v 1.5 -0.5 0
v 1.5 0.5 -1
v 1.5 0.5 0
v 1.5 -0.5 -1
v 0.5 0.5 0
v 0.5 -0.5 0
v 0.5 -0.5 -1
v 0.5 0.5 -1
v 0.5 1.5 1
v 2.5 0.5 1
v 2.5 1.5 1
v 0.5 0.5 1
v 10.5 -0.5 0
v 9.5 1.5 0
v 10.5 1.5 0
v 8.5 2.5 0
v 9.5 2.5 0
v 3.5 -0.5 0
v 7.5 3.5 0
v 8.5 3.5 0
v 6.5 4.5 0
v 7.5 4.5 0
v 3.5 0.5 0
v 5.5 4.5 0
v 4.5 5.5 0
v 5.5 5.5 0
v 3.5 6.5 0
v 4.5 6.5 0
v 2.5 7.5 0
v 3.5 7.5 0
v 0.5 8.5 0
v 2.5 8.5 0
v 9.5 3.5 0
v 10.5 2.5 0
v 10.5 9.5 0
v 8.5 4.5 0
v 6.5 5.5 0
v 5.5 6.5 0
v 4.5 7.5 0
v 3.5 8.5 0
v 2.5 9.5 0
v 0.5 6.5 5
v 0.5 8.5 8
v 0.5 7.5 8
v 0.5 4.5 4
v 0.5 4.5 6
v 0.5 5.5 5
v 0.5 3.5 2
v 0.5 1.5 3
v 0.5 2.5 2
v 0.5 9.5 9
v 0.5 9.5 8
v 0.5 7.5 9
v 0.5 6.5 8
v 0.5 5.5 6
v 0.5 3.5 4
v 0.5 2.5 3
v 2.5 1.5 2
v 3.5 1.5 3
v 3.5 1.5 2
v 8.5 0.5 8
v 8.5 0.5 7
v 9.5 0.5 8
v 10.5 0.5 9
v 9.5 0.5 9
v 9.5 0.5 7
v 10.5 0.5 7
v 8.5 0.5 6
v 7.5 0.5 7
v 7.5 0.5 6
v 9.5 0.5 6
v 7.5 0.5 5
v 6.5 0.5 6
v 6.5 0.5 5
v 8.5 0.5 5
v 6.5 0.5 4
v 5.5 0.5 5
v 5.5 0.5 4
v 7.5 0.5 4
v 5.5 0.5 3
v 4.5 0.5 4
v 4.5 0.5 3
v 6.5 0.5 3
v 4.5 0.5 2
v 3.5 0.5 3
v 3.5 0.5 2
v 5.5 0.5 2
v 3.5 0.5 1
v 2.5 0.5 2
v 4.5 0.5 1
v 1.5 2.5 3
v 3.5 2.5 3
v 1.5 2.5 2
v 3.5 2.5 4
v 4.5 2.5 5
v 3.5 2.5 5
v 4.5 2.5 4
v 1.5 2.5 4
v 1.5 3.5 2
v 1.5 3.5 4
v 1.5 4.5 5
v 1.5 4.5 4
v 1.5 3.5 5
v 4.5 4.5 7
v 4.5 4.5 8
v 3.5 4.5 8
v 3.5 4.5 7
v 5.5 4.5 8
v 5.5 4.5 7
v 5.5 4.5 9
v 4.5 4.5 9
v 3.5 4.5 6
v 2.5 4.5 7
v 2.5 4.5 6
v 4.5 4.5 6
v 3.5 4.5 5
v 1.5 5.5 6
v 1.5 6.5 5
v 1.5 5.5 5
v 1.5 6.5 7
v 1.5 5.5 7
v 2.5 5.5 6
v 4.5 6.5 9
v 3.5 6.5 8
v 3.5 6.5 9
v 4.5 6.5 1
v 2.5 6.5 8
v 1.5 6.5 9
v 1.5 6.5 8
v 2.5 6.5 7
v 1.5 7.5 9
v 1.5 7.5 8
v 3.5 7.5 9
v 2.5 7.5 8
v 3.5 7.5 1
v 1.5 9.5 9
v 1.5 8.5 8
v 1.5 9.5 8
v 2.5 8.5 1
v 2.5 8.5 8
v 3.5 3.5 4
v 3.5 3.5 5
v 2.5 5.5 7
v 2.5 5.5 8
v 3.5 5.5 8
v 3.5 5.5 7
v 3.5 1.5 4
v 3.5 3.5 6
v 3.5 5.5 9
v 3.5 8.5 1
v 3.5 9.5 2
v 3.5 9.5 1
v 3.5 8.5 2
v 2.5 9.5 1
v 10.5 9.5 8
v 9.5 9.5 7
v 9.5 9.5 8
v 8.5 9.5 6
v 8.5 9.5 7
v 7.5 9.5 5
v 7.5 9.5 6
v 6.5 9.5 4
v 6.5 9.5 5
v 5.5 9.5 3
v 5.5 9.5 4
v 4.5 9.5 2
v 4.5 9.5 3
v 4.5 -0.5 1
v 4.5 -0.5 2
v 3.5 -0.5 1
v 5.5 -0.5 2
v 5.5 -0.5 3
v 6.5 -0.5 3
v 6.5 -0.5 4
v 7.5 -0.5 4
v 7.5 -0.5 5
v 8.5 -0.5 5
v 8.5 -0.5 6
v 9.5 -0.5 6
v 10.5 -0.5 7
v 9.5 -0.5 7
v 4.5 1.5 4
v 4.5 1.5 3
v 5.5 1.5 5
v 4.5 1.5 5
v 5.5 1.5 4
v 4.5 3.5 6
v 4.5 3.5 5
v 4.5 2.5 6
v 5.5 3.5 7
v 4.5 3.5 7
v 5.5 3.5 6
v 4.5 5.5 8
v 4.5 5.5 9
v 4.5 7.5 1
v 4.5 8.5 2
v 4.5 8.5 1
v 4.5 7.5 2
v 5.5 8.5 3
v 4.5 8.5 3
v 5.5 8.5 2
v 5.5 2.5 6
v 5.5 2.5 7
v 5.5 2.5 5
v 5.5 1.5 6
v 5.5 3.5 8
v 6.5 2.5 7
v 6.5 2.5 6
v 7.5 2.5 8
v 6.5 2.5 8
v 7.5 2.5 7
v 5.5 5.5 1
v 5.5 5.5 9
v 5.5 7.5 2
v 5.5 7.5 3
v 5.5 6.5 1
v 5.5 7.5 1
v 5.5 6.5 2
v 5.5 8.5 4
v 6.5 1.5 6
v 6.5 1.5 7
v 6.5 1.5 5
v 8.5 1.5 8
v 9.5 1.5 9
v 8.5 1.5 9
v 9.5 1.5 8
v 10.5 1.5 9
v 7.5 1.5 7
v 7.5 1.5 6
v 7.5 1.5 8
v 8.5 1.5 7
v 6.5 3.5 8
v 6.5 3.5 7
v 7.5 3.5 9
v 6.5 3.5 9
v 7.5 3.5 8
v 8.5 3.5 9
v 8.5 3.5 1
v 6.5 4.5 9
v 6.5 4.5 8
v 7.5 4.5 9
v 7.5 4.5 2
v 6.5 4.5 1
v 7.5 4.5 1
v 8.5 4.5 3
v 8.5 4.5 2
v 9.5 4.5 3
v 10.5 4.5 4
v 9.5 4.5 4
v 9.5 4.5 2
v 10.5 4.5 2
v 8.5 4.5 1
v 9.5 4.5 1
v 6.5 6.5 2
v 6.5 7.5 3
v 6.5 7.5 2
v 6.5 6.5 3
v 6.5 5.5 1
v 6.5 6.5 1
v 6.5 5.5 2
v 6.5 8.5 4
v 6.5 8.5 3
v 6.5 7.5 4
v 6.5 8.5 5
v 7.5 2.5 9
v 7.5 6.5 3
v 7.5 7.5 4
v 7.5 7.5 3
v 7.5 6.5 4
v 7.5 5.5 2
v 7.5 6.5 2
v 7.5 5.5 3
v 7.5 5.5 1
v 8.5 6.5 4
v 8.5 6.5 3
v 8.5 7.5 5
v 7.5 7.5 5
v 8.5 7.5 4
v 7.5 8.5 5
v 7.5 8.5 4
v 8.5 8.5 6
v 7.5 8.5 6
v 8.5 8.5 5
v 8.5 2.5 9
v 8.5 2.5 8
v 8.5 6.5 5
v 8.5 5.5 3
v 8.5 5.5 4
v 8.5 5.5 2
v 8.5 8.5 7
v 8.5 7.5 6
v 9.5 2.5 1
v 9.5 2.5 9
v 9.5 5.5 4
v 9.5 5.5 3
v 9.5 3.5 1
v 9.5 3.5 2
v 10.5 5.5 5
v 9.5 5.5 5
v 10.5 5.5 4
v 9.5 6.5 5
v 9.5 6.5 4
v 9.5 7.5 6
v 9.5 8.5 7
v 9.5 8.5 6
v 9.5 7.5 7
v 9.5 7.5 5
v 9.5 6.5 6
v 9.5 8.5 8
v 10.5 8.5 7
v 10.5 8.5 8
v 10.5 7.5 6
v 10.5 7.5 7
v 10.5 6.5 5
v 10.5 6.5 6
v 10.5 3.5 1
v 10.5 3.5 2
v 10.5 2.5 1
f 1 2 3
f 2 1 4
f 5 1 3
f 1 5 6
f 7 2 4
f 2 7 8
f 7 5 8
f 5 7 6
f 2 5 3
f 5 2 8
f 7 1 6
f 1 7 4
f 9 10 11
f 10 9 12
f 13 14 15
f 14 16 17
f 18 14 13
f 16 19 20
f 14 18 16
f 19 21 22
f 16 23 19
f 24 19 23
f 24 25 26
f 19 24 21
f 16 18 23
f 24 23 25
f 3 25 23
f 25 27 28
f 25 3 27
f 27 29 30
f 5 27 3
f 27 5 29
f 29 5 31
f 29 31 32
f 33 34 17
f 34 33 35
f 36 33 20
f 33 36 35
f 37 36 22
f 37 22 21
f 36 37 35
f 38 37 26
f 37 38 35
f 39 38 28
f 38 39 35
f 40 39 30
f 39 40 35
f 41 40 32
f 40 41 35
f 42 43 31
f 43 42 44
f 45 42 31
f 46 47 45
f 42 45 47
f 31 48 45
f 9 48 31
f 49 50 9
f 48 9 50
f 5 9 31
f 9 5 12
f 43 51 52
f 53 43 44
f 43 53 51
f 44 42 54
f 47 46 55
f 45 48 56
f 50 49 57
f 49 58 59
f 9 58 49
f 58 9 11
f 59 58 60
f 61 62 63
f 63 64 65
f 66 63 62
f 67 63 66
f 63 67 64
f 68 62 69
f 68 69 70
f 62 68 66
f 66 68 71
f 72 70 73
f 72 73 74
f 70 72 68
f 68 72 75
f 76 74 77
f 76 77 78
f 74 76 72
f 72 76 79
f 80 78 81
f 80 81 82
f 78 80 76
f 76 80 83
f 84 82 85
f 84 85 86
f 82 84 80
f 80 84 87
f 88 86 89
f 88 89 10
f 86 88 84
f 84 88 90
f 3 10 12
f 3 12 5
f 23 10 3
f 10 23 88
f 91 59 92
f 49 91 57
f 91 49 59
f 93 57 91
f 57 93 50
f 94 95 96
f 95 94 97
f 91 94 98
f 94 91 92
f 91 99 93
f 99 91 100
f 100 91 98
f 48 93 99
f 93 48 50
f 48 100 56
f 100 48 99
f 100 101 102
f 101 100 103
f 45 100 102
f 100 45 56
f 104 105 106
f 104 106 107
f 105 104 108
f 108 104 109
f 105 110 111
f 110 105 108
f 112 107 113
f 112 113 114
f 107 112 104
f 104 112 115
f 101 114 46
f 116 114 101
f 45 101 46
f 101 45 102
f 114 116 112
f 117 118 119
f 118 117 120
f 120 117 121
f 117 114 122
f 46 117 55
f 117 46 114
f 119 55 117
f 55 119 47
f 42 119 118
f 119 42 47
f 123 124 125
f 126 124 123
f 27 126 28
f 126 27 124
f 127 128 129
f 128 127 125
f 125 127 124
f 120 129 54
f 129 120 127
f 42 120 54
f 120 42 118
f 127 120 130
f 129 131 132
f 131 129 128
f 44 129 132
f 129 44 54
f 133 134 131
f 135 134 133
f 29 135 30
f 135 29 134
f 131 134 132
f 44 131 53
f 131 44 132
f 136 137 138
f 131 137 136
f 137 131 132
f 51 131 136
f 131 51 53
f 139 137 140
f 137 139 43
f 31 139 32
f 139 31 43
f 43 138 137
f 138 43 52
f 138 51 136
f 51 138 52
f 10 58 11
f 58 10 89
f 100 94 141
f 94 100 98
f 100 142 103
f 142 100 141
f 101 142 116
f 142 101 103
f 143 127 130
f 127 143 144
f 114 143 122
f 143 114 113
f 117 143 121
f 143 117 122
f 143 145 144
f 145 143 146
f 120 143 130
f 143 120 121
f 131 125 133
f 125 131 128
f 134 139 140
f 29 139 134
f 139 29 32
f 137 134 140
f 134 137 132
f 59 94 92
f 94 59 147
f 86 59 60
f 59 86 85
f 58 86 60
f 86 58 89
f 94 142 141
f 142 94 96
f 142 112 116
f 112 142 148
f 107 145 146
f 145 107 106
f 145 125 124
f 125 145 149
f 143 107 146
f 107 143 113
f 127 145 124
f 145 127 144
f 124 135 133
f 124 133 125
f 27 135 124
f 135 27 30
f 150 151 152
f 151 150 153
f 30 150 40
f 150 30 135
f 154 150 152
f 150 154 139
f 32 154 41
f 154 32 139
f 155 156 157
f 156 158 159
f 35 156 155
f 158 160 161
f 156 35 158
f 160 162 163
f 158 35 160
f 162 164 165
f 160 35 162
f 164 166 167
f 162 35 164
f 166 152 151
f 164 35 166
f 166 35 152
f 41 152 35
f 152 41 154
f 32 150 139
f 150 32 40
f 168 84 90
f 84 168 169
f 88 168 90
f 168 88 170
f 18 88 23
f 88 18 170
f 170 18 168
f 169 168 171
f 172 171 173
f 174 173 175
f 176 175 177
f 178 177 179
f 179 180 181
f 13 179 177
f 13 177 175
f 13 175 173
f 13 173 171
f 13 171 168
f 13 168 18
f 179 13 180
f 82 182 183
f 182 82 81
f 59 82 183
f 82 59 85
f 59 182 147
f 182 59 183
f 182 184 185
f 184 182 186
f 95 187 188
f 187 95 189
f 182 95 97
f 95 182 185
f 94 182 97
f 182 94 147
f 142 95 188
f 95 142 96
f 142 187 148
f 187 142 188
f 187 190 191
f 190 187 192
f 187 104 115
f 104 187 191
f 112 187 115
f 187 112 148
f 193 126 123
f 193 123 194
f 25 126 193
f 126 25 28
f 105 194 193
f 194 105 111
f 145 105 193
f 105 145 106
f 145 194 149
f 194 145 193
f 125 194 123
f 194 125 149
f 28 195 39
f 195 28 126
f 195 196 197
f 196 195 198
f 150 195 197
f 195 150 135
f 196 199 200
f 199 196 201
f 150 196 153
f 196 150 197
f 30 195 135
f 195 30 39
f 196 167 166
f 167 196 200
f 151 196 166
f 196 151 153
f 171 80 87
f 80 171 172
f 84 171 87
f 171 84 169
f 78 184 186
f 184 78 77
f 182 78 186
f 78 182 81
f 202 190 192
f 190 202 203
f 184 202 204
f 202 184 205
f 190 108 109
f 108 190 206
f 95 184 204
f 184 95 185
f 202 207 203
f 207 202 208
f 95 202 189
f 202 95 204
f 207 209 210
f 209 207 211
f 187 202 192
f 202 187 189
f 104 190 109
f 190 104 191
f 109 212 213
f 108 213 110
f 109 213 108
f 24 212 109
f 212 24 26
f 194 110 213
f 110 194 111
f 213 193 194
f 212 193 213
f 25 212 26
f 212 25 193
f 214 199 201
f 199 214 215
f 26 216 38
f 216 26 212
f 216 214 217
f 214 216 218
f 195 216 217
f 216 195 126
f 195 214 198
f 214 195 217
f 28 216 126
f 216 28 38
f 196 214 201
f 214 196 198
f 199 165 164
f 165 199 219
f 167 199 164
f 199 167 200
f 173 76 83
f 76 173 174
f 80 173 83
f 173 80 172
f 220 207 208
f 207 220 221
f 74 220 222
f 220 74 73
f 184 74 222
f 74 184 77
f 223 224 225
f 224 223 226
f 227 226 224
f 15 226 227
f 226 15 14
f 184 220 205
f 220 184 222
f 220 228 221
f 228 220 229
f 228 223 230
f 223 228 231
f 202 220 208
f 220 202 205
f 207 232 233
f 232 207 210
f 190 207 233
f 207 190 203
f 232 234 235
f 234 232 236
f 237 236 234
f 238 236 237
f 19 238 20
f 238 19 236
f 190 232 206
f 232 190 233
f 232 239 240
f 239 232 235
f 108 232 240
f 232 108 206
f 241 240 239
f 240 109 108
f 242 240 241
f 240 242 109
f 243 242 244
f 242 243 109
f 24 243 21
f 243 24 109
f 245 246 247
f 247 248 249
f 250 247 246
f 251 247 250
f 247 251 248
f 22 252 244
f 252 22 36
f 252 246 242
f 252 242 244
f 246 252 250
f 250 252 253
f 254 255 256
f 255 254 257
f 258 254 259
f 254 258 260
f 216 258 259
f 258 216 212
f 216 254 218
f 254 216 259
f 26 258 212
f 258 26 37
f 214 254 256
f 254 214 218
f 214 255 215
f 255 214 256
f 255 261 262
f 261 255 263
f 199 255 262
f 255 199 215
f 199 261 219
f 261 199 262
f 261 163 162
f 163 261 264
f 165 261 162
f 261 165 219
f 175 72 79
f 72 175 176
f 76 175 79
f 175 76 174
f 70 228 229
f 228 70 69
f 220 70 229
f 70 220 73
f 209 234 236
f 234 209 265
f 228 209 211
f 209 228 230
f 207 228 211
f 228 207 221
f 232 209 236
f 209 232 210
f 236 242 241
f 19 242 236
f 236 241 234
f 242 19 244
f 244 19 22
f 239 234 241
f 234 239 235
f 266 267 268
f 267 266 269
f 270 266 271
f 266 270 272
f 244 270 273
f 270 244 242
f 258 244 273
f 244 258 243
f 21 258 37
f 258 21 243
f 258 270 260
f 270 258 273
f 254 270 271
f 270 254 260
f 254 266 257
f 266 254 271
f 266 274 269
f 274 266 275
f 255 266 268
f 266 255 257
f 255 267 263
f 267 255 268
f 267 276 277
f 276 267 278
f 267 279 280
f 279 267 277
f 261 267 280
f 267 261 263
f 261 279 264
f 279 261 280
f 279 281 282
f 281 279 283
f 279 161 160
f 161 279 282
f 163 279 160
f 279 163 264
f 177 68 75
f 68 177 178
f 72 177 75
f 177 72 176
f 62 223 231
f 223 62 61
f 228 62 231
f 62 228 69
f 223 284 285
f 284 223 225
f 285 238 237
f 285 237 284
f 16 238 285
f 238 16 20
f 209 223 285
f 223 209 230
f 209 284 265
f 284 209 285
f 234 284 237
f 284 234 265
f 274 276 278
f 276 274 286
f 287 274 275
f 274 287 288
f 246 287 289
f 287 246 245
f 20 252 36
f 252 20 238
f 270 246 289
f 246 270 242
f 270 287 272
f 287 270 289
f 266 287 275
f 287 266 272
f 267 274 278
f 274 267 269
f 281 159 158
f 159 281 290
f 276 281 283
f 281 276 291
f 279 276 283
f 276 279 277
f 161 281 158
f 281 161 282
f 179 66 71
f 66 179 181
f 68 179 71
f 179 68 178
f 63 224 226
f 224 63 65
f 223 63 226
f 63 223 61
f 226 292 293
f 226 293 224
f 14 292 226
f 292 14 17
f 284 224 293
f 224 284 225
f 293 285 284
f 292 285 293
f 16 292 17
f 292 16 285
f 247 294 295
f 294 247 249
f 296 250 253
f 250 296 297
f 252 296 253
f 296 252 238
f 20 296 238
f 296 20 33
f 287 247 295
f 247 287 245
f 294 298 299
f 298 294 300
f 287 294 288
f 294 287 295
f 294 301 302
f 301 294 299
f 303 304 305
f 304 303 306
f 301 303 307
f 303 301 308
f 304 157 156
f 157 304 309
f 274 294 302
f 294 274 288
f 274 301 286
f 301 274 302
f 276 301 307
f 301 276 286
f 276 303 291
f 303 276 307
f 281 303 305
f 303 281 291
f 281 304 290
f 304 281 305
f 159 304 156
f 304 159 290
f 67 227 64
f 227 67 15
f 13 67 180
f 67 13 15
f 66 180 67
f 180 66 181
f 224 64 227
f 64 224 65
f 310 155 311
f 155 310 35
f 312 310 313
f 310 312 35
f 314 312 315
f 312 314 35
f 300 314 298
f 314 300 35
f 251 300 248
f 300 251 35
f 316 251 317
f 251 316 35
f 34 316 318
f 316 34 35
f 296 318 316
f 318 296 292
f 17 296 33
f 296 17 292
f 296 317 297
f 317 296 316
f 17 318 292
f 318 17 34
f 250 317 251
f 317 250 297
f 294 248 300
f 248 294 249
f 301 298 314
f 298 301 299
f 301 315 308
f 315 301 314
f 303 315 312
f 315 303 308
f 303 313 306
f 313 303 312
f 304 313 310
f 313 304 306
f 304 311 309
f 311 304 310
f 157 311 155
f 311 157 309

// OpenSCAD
union() {
    translate([1, 0, -0.5]) color([1, 0, 0]) cube([1, 1, 1], center=true);
    translate([1, 1, 0.5]) cube([1, 1, 1], center=true);
    translate([1, 2, 1.5]) cube([1, 1, 3], center=true);
    translate([1, 3, 1.0]) cube([1, 1, 2], center=true);
    translate([1, 4, 2.0]) cube([1, 1, 4], center=true);
    translate([1, 5, 3.0]) cube([1, 1, 6], center=true);
    translate([1, 6, 2.5]) cube([1, 1, 5], center=true);
    translate([1, 7, 4.0]) cube([1, 1, 8], center=true);
    translate([1, 8, 4.5]) cube([1, 1, 9], center=true);
    translate([1, 9, 8.5]) color([0, 0, 1]) cube([1, 1, 1], center=true);
    translate([2, 1, 0.5]) cube([1, 1, 1], center=true);
    translate([2, 2, 1.5]) cube([1, 1, 3], center=true);
    translate([2, 3, 2.0]) cube([1, 1, 4], center=true);
    translate([2, 4, 2.5]) cube([1, 1, 5], center=true);
    translate([2, 5, 3.0]) cube([1, 1, 6], center=true);
    translate([2, 6, 3.5]) cube([1, 1, 7], center=true);
    translate([2, 7, 4.5]) cube([1, 1, 9], center=true);
    translate([2, 8, 4.0]) cube([1, 1, 8], center=true);
    translate([3, 1, 1.0]) cube([1, 1, 2], center=true);
    translate([3, 2, 1.5]) cube([1, 1, 3], center=true);
    translate([3, 3, 2.0]) cube([1, 1, 4], center=true);
    translate([3, 4, 2.5]) cube([1, 1, 5], center=true);
    translate([3, 5, 3.5]) cube([1, 1, 7], center=true);
    translate([3, 6, 4.0]) cube([1, 1, 8], center=true);
    translate([3, 7, 4.5]) cube([1, 1, 9], center=true);
    translate([3, 9, 0.5]) cube([1, 1, 1], center=true);
    translate([4, 0, 0.5]) cube([1, 1, 1], center=true);
    translate([4, 1, 1.5]) cube([1, 1, 3], center=true);
    translate([4, 2, 2.0]) cube([1, 1, 4], center=true);
    translate([4, 3, 2.5]) cube([1, 1, 5], center=true);
    translate([4, 4, 3.0]) cube([1, 1, 6], center=true);
    translate([4, 5, 4.0]) cube([1, 1, 8], center=true);
    translate([4, 6, 4.5]) cube([1, 1, 9], center=true);
    translate([4, 8, 0.5]) cube([1, 1, 1], center=true);
    translate([4, 9, 1.0]) cube([1, 1, 2], center=true);
    translate([5, 0, 1.0]) cube([1, 1, 2], center=true);
    translate([5, 1, 2.0]) cube([1, 1, 4], center=true);
    translate([5, 2, 2.5]) cube([1, 1, 5], center=true);
    translate([5, 3, 3.0]) cube([1, 1, 6], center=true);
    translate([5, 4, 3.5]) cube([1, 1, 7], center=true);
    translate([5, 5, 4.5]) cube([1, 1, 9], center=true);
    translate([5, 7, 0.5]) cube([1, 1, 1], center=true);
    translate([5, 8, 1.0]) cube([1, 1, 2], center=true);
    translate([5, 9, 1.5]) cube([1, 1, 3], center=true);
    translate([6, 0, 1.5]) cube([1, 1, 3], center=true);
    translate([6, 1, 2.5]) cube([1, 1, 5], center=true);
    translate([6, 2, 3.0]) cube([1, 1, 6], center=true);
    translate([6, 3, 3.5]) cube([1, 1, 7], center=true);
    translate([6, 4, 4.0]) cube([1, 1, 8], center=true);
    translate([6, 6, 0.5]) cube([1, 1, 1], center=true);
    translate([6, 7, 1.0]) cube([1, 1, 2], center=true);
    translate([6, 8, 1.5]) cube([1, 1, 3], center=true);
    translate([6, 9, 2.0]) cube([1, 1, 4], center=true);
    translate([7, 0, 2.0]) cube([1, 1, 4], center=true);
    translate([7, 1, 3.0]) cube([1, 1, 6], center=true);
    translate([7, 2, 3.5]) cube([1, 1, 7], center=true);
    translate([7, 3, 4.0]) cube([1, 1, 8], center=true);
    translate([7, 4, 4.5]) cube([1, 1, 9], center=true);
    translate([7, 5, 0.5]) cube([1, 1, 1], center=true);
    translate([7, 6, 1.0]) cube([1, 1, 2], center=true);
    translate([7, 7, 1.5]) cube([1, 1, 3], center=true);
    translate([7, 8, 2.0]) cube([1, 1, 4], center=true);
    translate([7, 9, 2.5]) cube([1, 1, 5], center=true);
    translate([8, 0, 2.5]) cube([1, 1, 5], center=true);
    translate([8, 1, 3.5]) cube([1, 1, 7], center=true);
    translate([8, 2, 4.0]) cube([1, 1, 8], center=true);
    translate([8, 3, 4.5]) cube([1, 1, 9], center=true);
    translate([8, 5, 1.0]) cube([1, 1, 2], center=true);
    translate([8, 6, 1.5]) cube([1, 1, 3], center=true);
    translate([8, 7, 2.0]) cube([1, 1, 4], center=true);
    translate([8, 8, 2.5]) cube([1, 1, 5], center=true);
    translate([8, 9, 3.0]) cube([1, 1, 6], center=true);
    translate([9, 0, 3.0]) cube([1, 1, 6], center=true);
    translate([9, 1, 4.0]) cube([1, 1, 8], center=true);
    translate([9, 2, 4.5]) cube([1, 1, 9], center=true);
    translate([9, 4, 0.5]) cube([1, 1, 1], center=true);
    translate([9, 5, 1.5]) cube([1, 1, 3], center=true);
    translate([9, 6, 2.0]) cube([1, 1, 4], center=true);
    translate([9, 7, 2.5]) cube([1, 1, 5], center=true);
    translate([9, 8, 3.0]) cube([1, 1, 6], center=true);
    translate([9, 9, 3.5]) cube([1, 1, 7], center=true);
    translate([10, 0, 3.5]) cube([1, 1, 7], center=true);
    translate([10, 1, 4.5]) cube([1, 1, 9], center=true);
    translate([10, 3, 0.5]) cube([1, 1, 1], center=true);
    translate([10, 4, 1.0]) cube([1, 1, 2], center=true);
    translate([10, 5, 2.0]) cube([1, 1, 4], center=true);
    translate([10, 6, 2.5]) cube([1, 1, 5], center=true);
    translate([10, 7, 3.0]) cube([1, 1, 6], center=true);
    translate([10, 8, 3.5]) cube([1, 1, 7], center=true);
    translate([10, 9, 4.0]) cube([1, 1, 8], center=true);
}
